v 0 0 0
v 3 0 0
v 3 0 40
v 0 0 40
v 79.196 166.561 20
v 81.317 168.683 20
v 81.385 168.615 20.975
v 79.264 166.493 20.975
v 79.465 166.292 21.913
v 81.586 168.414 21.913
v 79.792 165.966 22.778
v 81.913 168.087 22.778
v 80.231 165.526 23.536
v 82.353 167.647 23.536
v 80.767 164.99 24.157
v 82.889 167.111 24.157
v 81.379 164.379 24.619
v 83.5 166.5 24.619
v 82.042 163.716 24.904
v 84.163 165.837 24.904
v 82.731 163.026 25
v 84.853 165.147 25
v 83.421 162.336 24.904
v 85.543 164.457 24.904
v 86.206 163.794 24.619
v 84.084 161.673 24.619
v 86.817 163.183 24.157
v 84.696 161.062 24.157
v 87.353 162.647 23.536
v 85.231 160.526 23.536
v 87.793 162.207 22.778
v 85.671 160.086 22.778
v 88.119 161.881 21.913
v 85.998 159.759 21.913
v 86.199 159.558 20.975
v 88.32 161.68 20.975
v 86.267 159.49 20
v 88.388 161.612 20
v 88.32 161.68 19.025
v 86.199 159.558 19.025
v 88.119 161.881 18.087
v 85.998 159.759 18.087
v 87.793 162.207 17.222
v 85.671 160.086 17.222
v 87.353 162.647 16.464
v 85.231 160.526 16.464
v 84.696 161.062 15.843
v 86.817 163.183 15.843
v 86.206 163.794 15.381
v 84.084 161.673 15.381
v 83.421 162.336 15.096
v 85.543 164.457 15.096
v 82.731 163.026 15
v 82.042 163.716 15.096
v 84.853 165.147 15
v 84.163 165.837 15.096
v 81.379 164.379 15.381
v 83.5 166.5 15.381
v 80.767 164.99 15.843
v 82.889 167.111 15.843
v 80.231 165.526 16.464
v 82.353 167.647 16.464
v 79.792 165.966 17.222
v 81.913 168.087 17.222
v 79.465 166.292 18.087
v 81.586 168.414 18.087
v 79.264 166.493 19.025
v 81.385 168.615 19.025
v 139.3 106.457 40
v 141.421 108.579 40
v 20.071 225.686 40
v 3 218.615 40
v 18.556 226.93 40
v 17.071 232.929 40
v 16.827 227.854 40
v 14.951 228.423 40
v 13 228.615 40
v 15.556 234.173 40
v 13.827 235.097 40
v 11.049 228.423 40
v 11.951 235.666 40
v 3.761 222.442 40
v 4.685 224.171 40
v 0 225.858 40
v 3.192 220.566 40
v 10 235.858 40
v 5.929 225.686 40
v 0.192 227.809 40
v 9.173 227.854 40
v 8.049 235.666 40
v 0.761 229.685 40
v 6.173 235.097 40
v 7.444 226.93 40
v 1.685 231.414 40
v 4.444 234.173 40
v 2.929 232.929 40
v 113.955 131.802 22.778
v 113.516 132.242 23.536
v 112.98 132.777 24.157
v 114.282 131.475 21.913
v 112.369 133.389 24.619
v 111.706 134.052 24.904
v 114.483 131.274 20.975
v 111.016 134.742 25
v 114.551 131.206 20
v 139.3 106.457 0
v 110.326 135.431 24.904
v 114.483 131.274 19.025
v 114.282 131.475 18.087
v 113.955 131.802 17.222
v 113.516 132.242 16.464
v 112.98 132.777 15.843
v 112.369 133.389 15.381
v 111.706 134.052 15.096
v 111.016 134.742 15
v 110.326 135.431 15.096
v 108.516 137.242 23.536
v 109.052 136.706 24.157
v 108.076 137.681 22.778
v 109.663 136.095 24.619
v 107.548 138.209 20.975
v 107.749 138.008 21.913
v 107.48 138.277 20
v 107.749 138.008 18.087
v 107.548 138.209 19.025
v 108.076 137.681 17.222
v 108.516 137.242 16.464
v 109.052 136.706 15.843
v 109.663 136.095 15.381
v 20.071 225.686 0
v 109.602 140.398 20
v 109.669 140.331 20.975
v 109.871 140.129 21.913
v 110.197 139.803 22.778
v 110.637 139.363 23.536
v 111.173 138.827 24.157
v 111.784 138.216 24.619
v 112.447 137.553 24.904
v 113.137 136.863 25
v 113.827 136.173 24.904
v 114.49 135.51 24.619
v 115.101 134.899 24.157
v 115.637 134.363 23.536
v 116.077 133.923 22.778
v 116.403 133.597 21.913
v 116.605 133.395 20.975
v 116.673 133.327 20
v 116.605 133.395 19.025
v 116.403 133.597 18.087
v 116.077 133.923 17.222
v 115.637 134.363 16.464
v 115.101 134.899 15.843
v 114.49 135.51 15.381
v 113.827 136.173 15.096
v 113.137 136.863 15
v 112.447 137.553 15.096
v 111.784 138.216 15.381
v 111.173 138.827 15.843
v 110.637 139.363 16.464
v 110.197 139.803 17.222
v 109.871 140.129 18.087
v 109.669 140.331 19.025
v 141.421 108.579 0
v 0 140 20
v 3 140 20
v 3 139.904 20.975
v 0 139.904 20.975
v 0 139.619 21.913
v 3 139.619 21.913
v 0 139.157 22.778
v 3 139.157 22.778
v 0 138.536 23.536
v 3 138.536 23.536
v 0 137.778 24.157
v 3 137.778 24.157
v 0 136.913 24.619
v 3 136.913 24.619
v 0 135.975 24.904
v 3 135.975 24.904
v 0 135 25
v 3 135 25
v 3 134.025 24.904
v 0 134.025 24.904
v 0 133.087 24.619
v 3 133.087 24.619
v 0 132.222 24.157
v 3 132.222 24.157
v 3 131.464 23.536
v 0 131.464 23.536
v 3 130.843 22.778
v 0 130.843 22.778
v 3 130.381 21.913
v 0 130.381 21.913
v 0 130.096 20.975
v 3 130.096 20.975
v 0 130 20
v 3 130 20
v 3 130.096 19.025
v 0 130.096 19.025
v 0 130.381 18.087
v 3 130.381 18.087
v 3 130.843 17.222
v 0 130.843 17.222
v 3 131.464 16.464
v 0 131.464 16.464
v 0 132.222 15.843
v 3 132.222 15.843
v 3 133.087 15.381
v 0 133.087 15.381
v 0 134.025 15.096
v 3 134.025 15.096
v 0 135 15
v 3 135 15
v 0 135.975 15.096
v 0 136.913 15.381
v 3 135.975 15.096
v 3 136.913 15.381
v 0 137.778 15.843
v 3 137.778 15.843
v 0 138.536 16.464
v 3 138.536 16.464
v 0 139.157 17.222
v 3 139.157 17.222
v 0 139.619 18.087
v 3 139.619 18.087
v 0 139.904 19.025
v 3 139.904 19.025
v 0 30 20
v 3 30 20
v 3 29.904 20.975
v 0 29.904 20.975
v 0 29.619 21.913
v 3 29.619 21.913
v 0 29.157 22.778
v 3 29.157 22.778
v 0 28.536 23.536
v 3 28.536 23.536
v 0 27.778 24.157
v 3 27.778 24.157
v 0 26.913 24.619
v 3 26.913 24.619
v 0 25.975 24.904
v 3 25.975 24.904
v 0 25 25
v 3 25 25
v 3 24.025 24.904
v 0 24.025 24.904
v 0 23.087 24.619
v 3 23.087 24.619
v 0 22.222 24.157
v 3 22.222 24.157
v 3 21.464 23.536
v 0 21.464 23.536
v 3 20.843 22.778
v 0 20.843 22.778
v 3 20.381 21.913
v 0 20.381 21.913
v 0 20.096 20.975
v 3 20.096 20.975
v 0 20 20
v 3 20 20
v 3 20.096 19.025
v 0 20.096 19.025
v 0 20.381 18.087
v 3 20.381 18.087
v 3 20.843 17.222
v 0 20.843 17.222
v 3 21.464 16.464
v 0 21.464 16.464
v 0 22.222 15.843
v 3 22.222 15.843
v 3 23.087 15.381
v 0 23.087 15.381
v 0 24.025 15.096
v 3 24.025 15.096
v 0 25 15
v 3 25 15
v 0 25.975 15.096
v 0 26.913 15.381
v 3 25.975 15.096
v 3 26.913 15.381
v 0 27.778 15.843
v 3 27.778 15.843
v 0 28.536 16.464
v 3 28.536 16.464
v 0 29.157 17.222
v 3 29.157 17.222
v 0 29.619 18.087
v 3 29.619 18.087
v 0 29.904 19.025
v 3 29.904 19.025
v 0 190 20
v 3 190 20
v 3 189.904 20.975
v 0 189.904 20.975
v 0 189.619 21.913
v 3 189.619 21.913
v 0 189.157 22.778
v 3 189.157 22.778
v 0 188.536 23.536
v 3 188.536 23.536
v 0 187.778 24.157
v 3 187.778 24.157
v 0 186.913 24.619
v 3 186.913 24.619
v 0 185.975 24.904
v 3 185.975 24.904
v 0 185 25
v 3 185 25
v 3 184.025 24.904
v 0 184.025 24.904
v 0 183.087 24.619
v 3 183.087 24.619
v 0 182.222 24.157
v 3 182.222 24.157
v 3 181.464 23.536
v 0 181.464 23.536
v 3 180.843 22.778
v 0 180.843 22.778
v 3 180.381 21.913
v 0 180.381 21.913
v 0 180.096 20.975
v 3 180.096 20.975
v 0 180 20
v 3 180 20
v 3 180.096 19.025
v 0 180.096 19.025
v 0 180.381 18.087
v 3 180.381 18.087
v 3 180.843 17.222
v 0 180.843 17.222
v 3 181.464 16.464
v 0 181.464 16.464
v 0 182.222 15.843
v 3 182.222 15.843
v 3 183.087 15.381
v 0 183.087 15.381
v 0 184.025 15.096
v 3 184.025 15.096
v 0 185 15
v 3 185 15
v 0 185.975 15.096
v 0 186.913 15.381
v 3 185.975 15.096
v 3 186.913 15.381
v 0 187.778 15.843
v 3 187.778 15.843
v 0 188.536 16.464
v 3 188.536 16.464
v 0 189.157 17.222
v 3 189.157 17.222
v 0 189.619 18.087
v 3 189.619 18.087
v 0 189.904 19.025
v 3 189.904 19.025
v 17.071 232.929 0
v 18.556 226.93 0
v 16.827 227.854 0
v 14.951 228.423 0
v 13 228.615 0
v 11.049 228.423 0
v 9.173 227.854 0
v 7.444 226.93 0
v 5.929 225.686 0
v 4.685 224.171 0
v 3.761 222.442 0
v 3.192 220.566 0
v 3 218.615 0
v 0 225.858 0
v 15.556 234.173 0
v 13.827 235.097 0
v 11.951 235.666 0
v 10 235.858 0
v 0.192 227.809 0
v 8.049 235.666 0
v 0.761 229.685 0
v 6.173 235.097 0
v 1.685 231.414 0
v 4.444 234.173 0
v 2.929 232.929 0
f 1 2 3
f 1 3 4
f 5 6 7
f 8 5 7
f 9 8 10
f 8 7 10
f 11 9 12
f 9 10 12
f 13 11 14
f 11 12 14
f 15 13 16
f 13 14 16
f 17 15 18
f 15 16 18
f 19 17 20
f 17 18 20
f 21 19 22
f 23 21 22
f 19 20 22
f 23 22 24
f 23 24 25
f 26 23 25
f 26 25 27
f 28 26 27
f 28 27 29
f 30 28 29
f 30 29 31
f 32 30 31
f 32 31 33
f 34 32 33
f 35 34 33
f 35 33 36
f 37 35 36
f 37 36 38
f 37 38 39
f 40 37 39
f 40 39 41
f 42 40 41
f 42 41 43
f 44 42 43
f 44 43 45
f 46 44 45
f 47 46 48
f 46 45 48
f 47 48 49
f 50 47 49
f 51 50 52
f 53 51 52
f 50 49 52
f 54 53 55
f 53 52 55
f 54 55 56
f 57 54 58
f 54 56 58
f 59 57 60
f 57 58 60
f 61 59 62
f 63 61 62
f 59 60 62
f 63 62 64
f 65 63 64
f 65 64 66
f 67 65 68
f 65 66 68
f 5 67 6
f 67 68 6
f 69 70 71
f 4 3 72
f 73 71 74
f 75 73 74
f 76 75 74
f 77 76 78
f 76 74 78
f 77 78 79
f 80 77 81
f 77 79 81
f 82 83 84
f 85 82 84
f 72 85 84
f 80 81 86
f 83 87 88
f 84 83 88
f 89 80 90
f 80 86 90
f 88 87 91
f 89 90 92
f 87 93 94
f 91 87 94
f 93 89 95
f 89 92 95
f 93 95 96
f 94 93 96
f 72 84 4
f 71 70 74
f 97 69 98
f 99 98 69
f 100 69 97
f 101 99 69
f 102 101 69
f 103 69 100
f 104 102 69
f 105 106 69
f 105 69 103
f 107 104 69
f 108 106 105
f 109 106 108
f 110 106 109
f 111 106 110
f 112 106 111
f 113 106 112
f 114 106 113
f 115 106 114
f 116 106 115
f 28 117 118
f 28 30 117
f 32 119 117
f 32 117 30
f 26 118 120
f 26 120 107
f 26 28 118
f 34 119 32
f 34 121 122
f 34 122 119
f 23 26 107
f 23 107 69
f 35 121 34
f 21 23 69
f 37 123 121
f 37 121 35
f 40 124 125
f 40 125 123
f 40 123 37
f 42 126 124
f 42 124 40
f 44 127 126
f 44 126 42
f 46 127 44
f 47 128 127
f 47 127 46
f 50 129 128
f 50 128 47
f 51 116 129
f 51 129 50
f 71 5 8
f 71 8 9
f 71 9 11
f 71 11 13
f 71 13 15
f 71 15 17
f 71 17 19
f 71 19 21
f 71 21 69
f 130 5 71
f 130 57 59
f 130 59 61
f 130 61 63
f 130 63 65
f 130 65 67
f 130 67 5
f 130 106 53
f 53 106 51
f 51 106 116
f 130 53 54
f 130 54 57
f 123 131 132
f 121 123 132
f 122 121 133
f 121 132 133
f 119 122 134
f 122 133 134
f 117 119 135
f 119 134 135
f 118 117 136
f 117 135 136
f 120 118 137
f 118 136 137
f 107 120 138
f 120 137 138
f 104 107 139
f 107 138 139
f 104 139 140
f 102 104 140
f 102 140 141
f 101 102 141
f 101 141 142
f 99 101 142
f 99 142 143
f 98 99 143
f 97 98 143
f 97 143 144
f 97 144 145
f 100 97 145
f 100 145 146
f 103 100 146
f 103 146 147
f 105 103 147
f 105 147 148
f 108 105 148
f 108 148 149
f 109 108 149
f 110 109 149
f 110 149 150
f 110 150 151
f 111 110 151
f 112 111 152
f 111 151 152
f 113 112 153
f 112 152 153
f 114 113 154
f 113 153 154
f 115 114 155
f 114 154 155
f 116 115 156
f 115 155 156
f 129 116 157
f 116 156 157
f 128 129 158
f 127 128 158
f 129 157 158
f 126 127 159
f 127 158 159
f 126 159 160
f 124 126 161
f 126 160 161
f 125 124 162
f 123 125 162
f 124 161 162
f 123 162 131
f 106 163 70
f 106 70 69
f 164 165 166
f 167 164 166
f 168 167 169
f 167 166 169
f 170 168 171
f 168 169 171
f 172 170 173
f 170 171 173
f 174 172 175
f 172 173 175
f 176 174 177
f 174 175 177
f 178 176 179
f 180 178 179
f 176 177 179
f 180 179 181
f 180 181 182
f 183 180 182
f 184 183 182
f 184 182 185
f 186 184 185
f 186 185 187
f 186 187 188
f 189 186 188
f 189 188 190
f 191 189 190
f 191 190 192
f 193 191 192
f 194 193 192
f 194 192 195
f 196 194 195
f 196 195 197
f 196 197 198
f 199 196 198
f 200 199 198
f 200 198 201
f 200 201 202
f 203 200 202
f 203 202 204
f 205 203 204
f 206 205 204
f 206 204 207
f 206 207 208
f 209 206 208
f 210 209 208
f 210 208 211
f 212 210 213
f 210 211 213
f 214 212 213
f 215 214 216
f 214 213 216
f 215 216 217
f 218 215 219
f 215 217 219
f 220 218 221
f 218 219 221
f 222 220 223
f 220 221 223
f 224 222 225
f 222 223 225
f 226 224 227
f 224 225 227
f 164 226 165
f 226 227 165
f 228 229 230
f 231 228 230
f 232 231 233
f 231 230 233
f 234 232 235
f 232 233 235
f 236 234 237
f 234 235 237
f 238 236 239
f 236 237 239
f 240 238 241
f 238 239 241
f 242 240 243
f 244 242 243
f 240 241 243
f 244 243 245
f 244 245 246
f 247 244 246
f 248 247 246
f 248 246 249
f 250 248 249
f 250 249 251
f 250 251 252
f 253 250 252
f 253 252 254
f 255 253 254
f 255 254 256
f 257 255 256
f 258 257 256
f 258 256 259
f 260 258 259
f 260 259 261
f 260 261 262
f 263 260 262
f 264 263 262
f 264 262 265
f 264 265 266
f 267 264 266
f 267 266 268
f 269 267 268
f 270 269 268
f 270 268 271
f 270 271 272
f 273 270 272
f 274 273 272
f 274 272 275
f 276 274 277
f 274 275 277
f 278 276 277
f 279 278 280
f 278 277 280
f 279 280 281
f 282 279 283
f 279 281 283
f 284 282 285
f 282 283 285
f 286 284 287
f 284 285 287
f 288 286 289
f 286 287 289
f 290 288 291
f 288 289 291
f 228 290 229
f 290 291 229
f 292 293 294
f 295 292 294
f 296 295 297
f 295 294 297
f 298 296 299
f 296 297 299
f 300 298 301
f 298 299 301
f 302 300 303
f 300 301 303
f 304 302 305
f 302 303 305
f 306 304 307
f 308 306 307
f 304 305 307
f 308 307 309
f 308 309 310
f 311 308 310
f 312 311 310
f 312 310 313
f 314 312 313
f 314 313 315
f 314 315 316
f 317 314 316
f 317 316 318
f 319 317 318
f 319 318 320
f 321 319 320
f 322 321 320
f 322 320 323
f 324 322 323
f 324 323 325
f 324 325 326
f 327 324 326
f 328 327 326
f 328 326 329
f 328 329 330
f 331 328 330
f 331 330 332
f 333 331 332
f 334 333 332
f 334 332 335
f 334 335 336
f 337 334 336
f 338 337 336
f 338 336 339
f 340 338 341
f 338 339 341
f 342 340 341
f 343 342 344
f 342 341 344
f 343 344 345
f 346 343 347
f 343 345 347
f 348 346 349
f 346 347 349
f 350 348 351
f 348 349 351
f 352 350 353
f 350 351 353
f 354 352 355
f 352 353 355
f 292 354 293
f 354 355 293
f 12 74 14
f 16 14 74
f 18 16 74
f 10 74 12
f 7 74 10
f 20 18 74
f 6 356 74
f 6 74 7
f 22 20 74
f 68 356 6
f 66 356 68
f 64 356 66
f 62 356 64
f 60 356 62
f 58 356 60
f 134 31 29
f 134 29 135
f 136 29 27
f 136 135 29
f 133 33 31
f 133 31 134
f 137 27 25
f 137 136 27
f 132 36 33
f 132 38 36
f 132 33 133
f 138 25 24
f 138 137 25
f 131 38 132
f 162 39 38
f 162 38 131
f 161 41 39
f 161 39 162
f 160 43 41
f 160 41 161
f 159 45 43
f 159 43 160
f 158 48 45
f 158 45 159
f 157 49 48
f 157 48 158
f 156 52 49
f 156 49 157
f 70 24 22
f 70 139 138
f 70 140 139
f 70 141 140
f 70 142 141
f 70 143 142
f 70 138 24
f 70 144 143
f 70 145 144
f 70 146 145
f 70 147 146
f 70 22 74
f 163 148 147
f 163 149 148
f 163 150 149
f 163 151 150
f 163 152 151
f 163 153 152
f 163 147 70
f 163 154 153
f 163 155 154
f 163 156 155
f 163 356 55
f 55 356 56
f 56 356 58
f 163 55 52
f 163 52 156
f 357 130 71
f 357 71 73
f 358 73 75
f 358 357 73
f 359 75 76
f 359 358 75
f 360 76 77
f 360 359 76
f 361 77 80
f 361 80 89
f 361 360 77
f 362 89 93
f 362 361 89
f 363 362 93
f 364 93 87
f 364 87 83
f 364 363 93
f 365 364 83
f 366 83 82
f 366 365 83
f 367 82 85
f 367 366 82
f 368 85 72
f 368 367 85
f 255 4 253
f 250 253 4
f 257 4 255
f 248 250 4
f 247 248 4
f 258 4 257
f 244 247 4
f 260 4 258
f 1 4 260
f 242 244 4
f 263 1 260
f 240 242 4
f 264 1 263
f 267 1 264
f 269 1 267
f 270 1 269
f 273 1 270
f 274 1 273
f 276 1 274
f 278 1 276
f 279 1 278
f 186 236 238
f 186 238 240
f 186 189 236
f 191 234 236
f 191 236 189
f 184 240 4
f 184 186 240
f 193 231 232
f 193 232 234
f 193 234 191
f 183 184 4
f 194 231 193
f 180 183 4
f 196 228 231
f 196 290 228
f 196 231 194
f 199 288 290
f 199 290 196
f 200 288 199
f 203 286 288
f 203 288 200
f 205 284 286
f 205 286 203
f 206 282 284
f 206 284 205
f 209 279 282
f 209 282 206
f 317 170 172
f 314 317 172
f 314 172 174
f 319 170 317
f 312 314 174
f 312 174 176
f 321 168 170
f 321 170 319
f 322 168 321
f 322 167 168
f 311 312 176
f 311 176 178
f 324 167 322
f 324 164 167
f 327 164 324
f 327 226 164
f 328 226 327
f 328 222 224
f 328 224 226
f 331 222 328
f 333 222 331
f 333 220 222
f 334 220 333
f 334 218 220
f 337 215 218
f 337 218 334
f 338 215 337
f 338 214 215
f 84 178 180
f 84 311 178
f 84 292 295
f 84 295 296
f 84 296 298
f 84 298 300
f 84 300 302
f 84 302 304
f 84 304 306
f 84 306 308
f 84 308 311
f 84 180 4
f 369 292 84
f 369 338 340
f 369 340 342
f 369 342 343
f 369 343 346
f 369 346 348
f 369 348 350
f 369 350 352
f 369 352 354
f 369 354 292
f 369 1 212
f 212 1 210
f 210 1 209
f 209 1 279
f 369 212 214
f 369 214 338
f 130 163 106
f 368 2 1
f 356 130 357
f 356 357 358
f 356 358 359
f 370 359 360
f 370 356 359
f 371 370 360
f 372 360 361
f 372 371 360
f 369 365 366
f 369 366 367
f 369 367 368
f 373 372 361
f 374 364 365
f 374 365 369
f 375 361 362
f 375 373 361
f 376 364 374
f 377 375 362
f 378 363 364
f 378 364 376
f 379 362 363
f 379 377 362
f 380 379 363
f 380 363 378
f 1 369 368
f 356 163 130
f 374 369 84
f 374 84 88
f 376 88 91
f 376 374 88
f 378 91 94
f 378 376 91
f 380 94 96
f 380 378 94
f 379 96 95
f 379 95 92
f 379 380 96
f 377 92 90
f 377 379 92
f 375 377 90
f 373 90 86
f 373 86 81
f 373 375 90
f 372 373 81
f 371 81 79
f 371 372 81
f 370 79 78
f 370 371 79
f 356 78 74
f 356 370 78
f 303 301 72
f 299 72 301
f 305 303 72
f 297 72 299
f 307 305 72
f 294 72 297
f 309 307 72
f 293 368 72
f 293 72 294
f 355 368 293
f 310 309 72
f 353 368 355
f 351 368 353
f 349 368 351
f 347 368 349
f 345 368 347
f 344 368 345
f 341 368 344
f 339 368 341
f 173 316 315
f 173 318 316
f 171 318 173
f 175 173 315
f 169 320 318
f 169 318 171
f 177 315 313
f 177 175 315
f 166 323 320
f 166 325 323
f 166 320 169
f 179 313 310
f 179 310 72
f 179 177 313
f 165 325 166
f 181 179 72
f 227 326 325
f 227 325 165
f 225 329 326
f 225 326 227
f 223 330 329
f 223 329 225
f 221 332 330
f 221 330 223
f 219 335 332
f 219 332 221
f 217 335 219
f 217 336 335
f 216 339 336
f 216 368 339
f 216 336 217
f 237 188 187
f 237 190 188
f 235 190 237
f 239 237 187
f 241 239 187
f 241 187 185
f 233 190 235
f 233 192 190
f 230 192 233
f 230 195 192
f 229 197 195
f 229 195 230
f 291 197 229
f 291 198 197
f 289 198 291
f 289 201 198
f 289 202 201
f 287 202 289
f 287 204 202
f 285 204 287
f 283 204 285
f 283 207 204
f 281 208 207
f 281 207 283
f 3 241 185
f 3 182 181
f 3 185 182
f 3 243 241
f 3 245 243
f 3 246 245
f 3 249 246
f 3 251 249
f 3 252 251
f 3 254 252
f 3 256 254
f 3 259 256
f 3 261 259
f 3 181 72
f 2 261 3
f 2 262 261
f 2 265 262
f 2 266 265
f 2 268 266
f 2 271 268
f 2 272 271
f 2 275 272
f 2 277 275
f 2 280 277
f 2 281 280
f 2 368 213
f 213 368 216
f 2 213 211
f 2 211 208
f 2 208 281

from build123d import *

# Parameters (mm, degrees)
BOSS_EXTRUDE1_DEPTH = 40
SKETCH2_R           = 5
CUT_EXTRUDE1_DEPTH  = 40
SKETCH3_R           = 5
CUT_EXTRUDE2_DEPTH  = 40


with BuildPart() as part:
    # Sketch1 → Boss-Extrude1 (new body)
    with BuildSketch(Plane.XY):
        with BuildLine():
            Line((0, 0), (0, 225.857864376))
            ThreePointArc((0, 225.857864376), (6.173165676, 235.096659701), (17.071067812, 232.928932188))
            Line((17.071067812, 232.928932188), (141.421356237, 108.578643763))
            Line((141.421356237, 108.578643763), (139.300035894, 106.457323419))
            Line((139.300035894, 106.457323419), (20.071067812, 225.686291501))
            ThreePointArc((20.071067812, 225.686291501), (9.173165676, 227.854019014), (3, 218.615223689))
            Line((3, 218.615223689), (3, 0))
            Line((3, 0), (0, 0))
        make_face()
    extrude(amount=BOSS_EXTRUDE1_DEPTH)

    # Sketch2 → Cut-Extrude1 (cut)
    with BuildSketch(Plane(origin=(3, 0, 0), x_dir=(0, 0, -1), z_dir=(1, 0, 0))):
        with Locations(Location((-20, 185, 0), (0, 0, 90))):
            Circle(SKETCH2_R)
        with Locations(Location((-20, 25, 0), (0, 0, 90))):
            Circle(SKETCH2_R)
        with Locations(Location((-20, 135, 0), (0, 0, 90))):
            Circle(SKETCH2_R)
    extrude(amount=-CUT_EXTRUDE1_DEPTH, mode=Mode.SUBTRACT)

    # Sketch3 → Cut-Extrude2 (cut)
    with BuildSketch(Plane(origin=(125, 125, 0), x_dir=(0, 0, -1), z_dir=(0.7071067811865509, 0.7071067811865441, 0))):
        with Locations(Location((-20, 16.776695297, 0), (0, 0, 90))):
            Circle(SKETCH3_R)
        with Locations(Location((-20, 56.776695297, 0), (0, 0, 90))):
            Circle(SKETCH3_R)
    extrude(amount=-CUT_EXTRUDE2_DEPTH, mode=Mode.SUBTRACT)


solid = part.part
